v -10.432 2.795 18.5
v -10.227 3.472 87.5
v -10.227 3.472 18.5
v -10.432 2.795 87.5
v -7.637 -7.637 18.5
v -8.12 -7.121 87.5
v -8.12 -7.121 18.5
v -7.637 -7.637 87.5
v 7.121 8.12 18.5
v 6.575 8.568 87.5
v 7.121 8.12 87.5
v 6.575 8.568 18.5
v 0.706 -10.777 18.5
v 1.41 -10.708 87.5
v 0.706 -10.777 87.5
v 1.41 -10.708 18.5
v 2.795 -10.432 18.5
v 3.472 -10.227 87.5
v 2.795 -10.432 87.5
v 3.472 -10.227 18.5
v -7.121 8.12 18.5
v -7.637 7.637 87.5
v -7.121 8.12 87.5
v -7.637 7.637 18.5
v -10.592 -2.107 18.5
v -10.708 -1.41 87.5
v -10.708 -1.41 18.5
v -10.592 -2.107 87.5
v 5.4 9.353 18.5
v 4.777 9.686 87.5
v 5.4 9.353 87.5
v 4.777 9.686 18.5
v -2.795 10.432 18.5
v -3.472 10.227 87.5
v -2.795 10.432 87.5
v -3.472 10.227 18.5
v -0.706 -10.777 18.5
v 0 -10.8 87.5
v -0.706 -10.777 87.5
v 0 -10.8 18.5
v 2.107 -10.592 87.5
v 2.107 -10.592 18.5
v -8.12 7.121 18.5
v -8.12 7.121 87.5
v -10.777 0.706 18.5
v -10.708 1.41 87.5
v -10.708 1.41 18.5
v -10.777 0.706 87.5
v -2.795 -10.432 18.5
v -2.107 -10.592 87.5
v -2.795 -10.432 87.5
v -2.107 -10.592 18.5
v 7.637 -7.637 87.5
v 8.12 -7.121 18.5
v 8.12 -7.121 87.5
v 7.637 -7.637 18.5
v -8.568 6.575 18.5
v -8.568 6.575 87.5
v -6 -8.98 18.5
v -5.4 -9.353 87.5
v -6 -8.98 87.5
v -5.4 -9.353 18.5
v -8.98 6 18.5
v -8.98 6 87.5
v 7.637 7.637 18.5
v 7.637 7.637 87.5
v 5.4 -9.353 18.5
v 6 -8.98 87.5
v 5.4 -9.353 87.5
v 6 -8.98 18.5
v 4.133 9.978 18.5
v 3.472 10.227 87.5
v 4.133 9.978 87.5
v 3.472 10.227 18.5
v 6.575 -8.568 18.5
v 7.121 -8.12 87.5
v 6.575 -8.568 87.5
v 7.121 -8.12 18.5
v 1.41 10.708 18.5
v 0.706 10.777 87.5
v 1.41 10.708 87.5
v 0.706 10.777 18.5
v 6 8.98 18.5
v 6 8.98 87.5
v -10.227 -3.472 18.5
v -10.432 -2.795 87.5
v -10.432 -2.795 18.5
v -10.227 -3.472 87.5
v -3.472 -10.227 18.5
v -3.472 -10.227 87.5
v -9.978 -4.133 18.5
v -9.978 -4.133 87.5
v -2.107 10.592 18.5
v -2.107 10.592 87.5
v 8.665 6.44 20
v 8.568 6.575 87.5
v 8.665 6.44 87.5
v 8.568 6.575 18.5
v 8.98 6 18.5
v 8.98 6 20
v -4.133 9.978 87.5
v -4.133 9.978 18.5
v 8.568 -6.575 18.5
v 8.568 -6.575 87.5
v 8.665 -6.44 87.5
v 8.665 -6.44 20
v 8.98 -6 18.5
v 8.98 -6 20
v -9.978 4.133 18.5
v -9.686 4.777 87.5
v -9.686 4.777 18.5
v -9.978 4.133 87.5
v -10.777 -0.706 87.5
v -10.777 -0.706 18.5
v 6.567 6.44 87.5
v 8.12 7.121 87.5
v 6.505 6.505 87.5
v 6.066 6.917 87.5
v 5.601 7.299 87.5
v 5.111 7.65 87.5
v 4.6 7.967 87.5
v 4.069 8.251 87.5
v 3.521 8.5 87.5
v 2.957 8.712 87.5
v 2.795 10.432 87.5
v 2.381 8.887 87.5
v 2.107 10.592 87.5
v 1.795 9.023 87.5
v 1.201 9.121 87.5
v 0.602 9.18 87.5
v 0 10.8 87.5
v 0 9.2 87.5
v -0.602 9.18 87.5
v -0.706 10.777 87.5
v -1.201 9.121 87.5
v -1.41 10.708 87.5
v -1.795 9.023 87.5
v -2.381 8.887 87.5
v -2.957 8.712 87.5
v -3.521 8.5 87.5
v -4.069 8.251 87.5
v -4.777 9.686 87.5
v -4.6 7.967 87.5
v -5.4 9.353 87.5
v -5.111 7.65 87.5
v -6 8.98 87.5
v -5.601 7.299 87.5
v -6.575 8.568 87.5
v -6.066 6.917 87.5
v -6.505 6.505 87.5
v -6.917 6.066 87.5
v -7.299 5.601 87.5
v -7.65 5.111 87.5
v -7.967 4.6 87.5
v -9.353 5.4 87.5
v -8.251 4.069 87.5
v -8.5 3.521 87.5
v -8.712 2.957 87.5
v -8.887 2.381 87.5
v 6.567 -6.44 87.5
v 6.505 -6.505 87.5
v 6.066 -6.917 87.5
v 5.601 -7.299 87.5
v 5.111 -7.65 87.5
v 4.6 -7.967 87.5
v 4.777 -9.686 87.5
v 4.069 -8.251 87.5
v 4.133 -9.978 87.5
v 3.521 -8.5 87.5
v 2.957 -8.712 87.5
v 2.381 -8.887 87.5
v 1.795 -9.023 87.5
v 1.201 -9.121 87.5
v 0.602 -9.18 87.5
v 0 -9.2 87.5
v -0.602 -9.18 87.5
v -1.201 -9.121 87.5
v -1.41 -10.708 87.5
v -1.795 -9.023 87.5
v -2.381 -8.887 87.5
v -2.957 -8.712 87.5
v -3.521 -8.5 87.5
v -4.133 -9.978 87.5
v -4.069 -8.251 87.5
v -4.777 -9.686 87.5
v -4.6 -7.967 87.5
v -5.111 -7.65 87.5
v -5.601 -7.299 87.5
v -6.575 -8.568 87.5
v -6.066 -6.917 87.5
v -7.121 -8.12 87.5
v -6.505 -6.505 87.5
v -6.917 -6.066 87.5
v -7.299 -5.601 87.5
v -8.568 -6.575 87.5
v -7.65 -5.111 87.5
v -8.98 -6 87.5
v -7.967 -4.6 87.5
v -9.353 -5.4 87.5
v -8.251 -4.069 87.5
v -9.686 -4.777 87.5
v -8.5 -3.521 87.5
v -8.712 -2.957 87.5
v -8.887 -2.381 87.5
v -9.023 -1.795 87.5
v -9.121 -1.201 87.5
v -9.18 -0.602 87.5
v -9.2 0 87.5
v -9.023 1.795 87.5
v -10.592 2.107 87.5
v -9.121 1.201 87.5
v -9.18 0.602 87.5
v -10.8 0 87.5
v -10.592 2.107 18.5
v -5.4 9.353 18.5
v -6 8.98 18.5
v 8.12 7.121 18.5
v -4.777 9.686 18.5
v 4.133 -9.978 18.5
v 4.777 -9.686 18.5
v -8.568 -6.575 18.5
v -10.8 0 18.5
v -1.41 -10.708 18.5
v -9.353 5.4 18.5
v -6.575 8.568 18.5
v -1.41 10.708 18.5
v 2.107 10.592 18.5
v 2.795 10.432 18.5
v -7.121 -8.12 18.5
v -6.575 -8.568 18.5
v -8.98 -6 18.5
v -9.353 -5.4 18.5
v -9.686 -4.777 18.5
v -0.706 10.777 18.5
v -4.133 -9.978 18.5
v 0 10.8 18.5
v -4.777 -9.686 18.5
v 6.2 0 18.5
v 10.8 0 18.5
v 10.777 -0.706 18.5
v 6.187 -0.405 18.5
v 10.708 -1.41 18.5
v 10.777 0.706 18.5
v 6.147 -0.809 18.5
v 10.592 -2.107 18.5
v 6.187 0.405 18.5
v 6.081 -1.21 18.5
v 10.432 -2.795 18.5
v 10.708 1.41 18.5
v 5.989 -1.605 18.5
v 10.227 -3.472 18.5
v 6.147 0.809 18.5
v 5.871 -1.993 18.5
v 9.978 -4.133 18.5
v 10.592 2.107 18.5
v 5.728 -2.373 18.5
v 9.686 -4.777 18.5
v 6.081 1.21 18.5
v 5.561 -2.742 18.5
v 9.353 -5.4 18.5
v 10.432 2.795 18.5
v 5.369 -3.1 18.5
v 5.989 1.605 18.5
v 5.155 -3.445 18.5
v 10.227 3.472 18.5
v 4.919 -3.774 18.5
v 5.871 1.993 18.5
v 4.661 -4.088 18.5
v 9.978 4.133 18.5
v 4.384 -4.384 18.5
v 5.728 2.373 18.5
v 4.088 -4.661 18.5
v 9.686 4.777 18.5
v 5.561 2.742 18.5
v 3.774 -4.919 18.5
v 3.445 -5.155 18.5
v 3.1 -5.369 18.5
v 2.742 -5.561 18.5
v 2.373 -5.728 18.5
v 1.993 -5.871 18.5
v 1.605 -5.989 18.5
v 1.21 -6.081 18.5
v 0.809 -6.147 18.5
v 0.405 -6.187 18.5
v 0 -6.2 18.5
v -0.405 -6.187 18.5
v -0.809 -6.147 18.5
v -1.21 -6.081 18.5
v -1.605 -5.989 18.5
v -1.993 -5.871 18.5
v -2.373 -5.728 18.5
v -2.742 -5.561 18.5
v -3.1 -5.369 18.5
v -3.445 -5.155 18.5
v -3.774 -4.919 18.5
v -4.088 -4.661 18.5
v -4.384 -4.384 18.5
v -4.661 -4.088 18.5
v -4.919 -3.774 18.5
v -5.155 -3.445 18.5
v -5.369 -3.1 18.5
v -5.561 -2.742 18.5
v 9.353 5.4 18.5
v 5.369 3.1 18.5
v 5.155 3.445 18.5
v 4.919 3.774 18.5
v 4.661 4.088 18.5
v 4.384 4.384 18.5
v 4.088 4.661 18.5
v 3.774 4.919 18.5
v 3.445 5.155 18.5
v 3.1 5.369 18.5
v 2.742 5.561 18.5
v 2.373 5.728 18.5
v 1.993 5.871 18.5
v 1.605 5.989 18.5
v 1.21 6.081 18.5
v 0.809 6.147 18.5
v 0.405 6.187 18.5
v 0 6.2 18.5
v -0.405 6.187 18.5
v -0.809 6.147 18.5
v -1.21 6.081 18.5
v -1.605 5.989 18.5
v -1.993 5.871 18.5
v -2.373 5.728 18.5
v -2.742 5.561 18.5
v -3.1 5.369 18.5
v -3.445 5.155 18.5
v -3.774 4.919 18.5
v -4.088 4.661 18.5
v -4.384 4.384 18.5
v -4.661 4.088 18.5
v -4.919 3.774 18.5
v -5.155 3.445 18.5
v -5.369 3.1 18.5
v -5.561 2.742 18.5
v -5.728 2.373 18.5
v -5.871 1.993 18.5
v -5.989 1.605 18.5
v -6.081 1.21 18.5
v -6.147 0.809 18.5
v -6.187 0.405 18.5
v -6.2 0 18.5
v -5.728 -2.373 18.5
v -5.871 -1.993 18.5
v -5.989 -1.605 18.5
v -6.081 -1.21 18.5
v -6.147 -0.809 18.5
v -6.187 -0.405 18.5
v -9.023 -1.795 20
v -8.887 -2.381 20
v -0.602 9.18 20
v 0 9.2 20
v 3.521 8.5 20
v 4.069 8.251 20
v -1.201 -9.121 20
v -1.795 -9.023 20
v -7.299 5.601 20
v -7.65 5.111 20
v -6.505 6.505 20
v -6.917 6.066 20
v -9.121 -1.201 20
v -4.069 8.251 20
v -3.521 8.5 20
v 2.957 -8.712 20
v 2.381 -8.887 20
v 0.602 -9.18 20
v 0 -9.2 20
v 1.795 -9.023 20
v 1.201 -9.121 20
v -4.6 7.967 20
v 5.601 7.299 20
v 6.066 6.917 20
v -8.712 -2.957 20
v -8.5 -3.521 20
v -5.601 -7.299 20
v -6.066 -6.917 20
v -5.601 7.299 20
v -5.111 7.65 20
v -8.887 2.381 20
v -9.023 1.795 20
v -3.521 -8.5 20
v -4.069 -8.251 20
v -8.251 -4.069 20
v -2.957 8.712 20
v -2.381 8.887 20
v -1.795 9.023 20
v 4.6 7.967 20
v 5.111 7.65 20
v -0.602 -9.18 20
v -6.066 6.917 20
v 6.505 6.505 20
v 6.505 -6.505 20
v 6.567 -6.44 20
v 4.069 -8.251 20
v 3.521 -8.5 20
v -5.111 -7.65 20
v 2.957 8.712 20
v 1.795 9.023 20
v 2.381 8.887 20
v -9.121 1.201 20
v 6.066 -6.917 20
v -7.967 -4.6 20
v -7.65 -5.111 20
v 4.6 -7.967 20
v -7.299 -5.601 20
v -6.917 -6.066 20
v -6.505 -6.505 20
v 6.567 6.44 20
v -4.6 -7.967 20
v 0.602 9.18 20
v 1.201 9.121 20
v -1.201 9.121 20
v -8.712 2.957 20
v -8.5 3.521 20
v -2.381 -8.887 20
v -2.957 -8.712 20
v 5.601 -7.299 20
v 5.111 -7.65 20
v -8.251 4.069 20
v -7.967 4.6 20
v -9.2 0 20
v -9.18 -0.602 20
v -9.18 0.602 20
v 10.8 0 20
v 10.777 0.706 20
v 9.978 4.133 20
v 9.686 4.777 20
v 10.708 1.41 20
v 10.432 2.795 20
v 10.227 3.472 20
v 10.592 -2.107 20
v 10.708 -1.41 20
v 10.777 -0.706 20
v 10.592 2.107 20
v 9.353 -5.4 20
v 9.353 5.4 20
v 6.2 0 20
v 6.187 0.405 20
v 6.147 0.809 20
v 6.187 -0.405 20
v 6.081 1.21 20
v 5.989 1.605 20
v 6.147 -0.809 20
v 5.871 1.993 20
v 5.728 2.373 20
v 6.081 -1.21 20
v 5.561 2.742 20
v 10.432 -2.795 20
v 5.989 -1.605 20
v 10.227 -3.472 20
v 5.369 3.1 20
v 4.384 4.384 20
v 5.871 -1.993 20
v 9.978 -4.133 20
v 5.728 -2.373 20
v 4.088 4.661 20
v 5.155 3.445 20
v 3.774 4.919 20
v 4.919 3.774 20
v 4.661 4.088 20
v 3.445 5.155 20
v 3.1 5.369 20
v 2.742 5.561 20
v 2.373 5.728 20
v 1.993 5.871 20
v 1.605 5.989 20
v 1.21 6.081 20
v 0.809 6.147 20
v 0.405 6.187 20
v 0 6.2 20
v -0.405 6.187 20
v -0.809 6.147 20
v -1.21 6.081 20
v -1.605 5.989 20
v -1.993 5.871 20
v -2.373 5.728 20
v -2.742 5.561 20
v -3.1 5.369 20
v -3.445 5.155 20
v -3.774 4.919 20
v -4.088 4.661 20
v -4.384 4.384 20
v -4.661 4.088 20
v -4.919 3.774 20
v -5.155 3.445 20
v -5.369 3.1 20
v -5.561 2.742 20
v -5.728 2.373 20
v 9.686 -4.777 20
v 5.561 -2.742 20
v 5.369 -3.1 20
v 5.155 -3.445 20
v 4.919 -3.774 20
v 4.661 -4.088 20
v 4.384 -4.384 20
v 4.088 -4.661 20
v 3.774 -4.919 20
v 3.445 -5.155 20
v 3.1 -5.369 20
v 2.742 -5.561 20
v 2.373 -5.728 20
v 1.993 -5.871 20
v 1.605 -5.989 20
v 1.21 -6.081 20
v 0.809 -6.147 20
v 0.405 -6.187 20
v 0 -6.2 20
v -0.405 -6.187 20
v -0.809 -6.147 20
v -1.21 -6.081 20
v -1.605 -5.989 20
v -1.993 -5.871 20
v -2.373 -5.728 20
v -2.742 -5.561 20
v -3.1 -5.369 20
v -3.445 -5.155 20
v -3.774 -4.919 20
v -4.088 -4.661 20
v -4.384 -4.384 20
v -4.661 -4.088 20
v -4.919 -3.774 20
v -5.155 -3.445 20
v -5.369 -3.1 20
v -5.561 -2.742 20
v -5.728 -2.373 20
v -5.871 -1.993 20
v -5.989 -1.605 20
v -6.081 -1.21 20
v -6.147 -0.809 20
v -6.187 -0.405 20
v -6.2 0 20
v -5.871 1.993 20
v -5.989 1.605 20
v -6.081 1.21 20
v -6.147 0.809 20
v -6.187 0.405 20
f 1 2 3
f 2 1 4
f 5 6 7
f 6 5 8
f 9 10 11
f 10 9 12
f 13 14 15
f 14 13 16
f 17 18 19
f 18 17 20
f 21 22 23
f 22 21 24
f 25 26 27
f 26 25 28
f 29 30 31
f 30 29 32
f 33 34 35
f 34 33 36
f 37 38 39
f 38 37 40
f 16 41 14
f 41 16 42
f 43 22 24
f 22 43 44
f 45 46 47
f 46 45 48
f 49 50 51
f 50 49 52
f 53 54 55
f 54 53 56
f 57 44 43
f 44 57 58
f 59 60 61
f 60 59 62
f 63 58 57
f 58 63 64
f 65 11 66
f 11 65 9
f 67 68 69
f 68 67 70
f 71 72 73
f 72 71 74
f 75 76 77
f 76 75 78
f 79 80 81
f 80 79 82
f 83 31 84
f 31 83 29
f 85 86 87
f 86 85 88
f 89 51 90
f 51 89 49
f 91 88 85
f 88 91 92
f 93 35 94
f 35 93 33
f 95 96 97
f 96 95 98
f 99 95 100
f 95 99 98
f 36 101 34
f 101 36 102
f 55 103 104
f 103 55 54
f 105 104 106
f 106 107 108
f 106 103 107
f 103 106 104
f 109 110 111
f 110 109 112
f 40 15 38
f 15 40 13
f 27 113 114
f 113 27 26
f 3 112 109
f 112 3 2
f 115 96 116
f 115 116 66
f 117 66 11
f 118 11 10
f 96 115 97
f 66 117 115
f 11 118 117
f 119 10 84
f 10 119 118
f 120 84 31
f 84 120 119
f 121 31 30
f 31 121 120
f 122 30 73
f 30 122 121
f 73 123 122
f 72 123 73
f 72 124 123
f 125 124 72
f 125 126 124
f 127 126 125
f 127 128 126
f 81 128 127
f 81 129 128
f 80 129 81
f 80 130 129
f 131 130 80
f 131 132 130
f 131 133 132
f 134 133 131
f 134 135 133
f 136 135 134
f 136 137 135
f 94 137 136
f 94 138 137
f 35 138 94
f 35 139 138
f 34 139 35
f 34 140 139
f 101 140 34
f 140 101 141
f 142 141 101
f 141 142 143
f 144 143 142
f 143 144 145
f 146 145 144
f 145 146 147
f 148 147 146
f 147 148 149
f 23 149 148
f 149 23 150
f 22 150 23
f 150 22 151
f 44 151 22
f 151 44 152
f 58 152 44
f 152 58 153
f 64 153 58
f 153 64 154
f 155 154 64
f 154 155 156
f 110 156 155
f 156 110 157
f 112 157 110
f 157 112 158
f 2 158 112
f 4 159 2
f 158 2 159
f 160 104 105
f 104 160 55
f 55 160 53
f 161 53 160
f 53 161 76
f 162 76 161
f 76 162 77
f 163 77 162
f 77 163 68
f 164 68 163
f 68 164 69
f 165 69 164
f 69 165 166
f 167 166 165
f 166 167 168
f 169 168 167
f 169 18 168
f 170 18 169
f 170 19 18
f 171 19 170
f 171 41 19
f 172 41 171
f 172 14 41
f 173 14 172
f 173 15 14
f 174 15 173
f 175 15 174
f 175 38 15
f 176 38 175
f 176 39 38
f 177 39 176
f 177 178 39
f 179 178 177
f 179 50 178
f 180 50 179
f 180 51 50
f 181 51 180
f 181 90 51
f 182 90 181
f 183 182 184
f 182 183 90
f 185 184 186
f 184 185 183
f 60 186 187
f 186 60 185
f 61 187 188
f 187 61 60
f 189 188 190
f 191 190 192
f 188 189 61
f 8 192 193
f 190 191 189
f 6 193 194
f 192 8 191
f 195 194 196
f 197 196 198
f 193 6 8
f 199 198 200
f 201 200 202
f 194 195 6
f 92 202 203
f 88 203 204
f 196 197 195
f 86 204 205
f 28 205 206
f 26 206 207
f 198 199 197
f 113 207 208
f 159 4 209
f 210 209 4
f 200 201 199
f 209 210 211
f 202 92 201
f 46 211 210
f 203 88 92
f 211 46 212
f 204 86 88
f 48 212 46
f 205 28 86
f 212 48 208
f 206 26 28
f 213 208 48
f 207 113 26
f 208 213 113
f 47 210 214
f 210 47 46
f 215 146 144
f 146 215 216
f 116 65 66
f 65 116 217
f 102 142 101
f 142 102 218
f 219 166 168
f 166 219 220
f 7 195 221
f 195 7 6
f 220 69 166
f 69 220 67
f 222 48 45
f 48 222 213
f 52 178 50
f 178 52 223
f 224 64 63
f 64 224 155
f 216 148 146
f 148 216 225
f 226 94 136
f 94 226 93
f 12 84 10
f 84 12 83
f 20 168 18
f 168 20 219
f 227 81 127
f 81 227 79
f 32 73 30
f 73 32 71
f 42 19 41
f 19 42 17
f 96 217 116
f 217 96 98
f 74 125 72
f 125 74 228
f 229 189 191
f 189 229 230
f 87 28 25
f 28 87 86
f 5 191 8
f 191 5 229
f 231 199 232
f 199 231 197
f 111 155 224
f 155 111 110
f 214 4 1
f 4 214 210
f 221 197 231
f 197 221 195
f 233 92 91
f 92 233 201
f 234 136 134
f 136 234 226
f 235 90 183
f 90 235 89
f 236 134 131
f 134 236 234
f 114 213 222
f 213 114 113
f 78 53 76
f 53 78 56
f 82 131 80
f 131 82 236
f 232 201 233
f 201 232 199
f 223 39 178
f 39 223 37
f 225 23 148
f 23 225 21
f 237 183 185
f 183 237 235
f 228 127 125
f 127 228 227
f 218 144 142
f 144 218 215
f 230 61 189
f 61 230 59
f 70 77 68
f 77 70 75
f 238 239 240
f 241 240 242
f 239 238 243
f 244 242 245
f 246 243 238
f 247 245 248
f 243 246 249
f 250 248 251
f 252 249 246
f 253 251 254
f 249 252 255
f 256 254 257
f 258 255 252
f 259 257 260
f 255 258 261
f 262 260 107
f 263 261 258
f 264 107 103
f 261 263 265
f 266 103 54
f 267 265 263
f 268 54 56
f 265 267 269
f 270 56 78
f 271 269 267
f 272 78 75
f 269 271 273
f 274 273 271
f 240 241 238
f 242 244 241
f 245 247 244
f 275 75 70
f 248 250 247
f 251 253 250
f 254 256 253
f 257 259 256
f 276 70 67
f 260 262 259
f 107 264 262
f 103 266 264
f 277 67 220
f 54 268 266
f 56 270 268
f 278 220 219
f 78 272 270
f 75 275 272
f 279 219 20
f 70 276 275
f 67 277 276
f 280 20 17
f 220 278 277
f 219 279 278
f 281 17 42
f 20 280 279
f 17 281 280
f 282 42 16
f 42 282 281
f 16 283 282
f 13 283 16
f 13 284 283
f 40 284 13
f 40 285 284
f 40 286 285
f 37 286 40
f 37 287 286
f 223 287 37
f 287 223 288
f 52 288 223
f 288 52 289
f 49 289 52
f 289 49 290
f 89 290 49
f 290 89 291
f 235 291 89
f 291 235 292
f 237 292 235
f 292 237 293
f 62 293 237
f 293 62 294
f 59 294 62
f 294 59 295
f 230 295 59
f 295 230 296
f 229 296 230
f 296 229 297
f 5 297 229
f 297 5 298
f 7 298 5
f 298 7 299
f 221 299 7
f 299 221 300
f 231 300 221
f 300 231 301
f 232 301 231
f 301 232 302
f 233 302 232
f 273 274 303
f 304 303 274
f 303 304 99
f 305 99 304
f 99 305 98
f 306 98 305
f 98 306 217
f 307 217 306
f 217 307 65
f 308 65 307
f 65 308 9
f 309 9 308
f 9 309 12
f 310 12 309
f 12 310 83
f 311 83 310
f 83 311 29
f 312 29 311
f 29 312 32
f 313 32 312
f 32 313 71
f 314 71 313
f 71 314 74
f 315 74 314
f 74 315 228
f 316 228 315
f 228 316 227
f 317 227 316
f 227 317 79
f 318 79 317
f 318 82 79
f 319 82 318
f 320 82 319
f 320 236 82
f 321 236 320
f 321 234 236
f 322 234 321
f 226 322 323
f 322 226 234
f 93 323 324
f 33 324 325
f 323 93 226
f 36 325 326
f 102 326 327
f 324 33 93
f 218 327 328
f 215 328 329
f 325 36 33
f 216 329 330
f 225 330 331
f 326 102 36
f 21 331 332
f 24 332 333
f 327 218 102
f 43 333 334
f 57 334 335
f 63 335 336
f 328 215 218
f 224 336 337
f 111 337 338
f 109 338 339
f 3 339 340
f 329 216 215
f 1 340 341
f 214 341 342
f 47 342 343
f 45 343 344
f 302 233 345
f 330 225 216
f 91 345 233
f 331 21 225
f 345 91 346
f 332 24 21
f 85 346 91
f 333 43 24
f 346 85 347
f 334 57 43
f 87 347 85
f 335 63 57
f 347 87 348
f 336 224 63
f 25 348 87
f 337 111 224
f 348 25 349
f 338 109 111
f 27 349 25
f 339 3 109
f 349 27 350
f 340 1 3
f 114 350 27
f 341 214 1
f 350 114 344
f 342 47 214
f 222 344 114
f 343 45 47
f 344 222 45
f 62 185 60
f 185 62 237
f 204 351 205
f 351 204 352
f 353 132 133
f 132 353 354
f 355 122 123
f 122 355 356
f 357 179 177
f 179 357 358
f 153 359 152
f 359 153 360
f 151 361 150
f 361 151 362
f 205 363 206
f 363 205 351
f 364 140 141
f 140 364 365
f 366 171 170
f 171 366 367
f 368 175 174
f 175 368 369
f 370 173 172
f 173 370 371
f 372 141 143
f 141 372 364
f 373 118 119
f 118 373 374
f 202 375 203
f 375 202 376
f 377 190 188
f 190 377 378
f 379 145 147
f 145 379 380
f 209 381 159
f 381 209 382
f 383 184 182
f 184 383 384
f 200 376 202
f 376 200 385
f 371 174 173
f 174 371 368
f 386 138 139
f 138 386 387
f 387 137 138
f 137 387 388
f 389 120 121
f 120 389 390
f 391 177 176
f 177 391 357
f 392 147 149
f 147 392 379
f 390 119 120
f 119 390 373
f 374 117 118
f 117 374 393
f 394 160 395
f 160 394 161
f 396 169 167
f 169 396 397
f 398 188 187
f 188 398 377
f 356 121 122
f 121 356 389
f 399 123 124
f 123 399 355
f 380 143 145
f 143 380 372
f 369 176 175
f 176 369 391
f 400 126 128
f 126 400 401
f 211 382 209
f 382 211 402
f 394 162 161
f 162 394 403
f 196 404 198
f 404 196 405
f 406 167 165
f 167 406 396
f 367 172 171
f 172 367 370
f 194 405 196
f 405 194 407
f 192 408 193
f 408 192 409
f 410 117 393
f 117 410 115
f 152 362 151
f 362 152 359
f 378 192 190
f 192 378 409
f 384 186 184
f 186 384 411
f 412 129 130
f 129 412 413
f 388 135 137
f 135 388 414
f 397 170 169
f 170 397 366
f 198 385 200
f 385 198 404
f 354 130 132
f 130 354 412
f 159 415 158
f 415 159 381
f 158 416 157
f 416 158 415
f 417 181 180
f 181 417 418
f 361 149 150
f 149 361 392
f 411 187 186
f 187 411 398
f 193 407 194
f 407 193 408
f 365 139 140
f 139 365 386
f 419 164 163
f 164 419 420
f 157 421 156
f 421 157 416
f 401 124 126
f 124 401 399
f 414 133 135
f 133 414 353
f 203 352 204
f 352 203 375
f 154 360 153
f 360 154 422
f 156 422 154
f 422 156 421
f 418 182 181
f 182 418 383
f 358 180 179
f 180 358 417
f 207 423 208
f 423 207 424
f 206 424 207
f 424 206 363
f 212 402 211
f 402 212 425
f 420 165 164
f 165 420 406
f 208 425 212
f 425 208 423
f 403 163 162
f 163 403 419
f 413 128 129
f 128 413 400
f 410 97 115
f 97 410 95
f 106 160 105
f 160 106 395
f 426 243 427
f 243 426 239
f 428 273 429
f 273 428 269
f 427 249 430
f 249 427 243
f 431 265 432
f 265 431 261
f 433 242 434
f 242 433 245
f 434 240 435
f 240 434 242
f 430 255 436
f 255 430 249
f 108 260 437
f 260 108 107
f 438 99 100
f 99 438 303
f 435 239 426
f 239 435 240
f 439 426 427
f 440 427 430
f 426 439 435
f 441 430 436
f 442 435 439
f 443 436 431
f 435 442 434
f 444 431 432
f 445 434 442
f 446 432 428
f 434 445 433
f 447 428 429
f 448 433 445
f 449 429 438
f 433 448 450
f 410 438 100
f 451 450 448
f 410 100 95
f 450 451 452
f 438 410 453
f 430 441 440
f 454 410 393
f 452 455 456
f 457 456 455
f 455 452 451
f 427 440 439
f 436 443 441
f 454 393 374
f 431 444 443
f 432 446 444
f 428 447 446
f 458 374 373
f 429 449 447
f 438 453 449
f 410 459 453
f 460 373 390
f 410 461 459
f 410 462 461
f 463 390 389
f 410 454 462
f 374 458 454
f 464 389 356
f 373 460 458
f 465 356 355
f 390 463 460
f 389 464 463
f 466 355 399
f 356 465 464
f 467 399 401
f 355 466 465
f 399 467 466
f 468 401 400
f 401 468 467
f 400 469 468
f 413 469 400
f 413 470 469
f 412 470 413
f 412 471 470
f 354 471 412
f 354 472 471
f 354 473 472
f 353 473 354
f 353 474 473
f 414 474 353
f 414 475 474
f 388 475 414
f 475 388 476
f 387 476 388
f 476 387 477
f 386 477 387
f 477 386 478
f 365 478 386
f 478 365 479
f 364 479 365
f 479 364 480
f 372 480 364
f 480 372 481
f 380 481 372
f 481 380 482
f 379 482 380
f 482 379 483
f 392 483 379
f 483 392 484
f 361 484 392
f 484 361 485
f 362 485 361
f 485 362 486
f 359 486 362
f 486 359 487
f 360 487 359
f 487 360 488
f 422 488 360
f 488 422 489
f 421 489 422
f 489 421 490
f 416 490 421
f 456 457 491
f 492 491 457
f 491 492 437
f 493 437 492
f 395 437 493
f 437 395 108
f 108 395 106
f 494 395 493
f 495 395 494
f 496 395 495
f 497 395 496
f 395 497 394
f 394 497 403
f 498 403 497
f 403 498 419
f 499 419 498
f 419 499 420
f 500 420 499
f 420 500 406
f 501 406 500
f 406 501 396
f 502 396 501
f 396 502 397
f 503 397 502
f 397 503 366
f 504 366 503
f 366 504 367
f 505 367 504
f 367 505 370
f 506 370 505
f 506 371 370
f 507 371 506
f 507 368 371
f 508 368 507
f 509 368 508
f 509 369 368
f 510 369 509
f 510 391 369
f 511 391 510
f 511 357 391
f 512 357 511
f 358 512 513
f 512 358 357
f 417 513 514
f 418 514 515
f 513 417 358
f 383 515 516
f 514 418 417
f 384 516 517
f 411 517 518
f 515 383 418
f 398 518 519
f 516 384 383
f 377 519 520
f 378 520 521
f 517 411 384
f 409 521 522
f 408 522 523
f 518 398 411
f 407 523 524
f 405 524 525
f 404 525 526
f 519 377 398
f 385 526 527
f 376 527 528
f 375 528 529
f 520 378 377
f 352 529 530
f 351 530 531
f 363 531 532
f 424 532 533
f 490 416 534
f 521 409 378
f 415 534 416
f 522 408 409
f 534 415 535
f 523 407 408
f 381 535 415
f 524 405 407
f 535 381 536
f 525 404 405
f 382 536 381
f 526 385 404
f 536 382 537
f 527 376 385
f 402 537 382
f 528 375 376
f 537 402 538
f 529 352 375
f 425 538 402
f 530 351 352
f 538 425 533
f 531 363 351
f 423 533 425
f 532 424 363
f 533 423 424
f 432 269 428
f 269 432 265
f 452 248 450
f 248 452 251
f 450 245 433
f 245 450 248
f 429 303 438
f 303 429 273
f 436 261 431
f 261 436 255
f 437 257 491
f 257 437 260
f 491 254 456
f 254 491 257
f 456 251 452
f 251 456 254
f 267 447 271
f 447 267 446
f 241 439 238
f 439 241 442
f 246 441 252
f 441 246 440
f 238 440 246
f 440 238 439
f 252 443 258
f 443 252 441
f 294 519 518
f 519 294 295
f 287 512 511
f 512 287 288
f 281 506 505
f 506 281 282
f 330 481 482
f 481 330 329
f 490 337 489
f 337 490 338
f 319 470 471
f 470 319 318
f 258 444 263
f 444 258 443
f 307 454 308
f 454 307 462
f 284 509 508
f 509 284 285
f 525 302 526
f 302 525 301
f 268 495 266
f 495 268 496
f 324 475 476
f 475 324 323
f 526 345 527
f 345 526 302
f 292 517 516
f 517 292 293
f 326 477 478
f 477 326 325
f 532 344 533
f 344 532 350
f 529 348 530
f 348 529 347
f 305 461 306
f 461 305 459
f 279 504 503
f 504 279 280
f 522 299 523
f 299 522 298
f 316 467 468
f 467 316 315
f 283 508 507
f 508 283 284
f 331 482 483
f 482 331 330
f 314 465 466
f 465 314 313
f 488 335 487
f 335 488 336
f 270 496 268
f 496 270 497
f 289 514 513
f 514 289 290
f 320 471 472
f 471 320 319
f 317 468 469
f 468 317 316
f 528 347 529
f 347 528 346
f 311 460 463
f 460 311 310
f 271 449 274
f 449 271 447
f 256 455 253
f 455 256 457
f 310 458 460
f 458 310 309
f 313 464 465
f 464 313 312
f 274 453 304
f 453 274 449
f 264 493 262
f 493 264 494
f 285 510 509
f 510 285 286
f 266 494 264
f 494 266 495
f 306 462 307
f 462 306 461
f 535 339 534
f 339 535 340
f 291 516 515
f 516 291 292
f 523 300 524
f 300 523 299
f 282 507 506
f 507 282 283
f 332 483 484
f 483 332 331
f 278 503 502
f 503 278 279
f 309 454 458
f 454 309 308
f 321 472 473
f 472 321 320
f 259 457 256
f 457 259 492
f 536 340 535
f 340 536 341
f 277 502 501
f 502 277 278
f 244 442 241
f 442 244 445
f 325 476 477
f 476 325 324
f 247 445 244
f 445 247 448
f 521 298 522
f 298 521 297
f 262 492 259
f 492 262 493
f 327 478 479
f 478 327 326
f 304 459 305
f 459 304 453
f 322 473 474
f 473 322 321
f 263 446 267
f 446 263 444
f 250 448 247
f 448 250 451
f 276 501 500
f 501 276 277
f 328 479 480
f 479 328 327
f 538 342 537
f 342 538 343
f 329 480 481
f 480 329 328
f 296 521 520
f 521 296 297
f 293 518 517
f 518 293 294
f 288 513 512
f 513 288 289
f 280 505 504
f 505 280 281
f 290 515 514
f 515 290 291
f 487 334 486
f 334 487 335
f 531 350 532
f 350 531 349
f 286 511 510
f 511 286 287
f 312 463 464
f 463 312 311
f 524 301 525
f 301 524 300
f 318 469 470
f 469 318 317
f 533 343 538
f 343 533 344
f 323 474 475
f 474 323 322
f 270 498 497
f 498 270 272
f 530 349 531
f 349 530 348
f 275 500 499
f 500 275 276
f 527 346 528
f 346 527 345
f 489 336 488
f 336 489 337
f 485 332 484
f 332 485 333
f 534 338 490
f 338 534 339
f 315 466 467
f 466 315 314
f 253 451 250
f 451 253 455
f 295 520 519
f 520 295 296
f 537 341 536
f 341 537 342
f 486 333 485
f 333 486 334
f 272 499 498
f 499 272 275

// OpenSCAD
// oyster-chassis.scad
// Sliding chassis for the Oyster island wind-station emitter tube.
// Holds the 18650 cell, the Pico, the RFM95W and the antenna feed in line
// inside a 30.5 mm PVC bore. Parameterised: every number is named and the
// physical rules are enforced by assertions at the bottom of this block.
//
// Render one station at a time to stay inside 4 GB of RAM:
//   openscad -D part=0 -o /tmp/stack.stl     oyster-chassis.scad  // full stack
//   openscad -D part=1 -o /tmp/cradle.stl    oyster-chassis.scad  // cell cradle
//   openscad -D part=2 -o /tmp/section_a.stl oyster-chassis.scad  // z 0   -> 89
//   openscad -D part=3 -o /tmp/section_b.stl oyster-chassis.scad  // z 89  -> 357

$fn = 96; // modest tessellation for a 4 GB machine

// Numeric part selector: integers only, since -D part="name" is stripped by the
// shell and silently falls through to the default branch.
//   0 = full stack   1 = cell cradle   2 = section_a (z 0->89)   3 = section_b (z 89->357)
part = 0;

// ---------------------------------------------------------------------------
// Parameter block
// ---------------------------------------------------------------------------

// --- PVC tube (measured with a caliper) ---
pvc_bore = 30.5;   // measured: PVC inner diameter
pvc_od   = 34.2;   // measured: PVC outer diameter
pvc_wall = 1.85;   // measured: PVC wall thickness

// --- Printed chassis ---
chassis_od   = 29.7;                          // derived: pvc_bore - 0.8 mm diametral clearance
chassis_wall = 1.8;                           // design: printed wall
chassis_bore = chassis_od - 2 * chassis_wall; // derived: ~26.1 mm internal bore

// --- Printer ---
printer_z = 300;   // measured: Voron usable Z

// --- Components (measured) ---
cell_d      = 18.4;  // measured: protected 18650 diameter
cell_l      = 69.0;  // measured: protected 18650 length (protected ~5 mm longer than bare)
cell_hold_w = 21.0;  // measured: cell-in-cradle width
cell_hold_h = 17.0;  // measured: cell-in-cradle depth
pico_w      = 21.0;  // measured: Pico width  (CONFIRM with calipers before printing)
pico_l      = 51.0;  // measured: Pico length (CONFIRM with calipers before printing)
pico_t      = 4.0;   // measured: Pico thickness
pico_bay_t  = 6.0;   // design: Pico + solder joints, no Dupont header stack
radio_w     = 16.0;  // measured: RFM95W width
radio_l     = 16.0;  // measured: RFM95W length

// --- Cell cradle (design) ---
cradle_od   = 21.6;                 // design: snap-in thin C-sleeve outer diameter
cradle_wall = 1.6;                  // design: thin wall so the snap can flex
cradle_bore = cradle_od - 2*cradle_wall; // derived: 18.4 mm resting grip bore
                                    //   (the C-slot lets the sleeve flex past the
                                    //    18.4 cell; cradle_grip is the flexed entry)
cradle_grip  = cell_d + 0.4;        // derived: 18.8 mm flexed grip / snap entry
cradle_slot  = 0.70 * cell_d;       // derived: slot width ~70 % of cell diameter
stop_ring_h  = 1.5;                 // design: bottom stop-ring shoulder, cell rests here
stop_hole_d  = cell_d - 6.0;        // derived: 12.4 mm stop-ring hole (3 mm shoulder)

// --- RF / antenna (physics, do not change) ---
freq_mhz      = 868;              // frozen: LoRa centre frequency
lambda        = 300 / freq_mhz * 1000; // derived: ~345.6 mm at 868 MHz
lambda_quarter = lambda / 4;     // derived: ~86.4 mm
lambda_tenth   = lambda / 10;    // derived: ~34.6 mm
radiator_len  = 86.0;            // design: straight lambda/4 wire on axis
clearance_min = 50.0;            // design: minimum radiator clearance (>= lambda/10 ideal 80-100)

// --- Station layout, bottom (z=0) to top (measured/derived stack-up) ---
cap_h        = 20.0;                     // service cap + desiccant space
cell_z0      = cap_h;                    // 20
cell_z1      = cell_z0 + cell_l;         // 89
pico_bay_l   = 56.0;                     // Pico bay, wires leaving axially
pico_z0      = cell_z1;                  // 89
pico_z1      = pico_z0 + pico_bay_l;     // 145
sleeve_l     = 90.0;                     // counterpoise sleeve carrier
sleeve_z0    = pico_z1;                  // 145
sleeve_z1    = sleeve_z0 + sleeve_l;     // 235
radio_z0     = sleeve_z1;                // 235
radio_z1     = radio_z0 + radio_l;       // 251
radiator_z0  = radio_z1;                 // 251
radiator_z1  = radiator_z0 + radiator_len; // 337
headroom     = 20.0;                     // headroom to the sealed top
total_l      = radiator_z1 + headroom;   // 357

split_z      = cell_z1;                  // 89: joint in the plain region above the cell
section_a_l  = split_z;                  // 0   -> 89
section_b_l  = total_l - split_z;        // 89  -> 357

// --- Counterpoise sleeve carrier (design) ---
sleeve_boss_od = 20.0;   // design: slides inside a 22 mm copper-pipe offcut (ID ~20.2)

// --- Derived clearances: radiator start to the hottest conductors below it ---
clearance_cell = radiator_z0 - cell_z1;  // derived: 251 - 89  = 162
clearance_pico = radiator_z0 - pico_z1;  // derived: 251 - 145 = 106

// ---------------------------------------------------------------------------
// Assertions: encode the physical rules. Do not loosen to make a render pass.
// ---------------------------------------------------------------------------
assert(chassis_od < pvc_bore,
       "chassis OD must be under the PVC bore");
assert(chassis_bore > cell_d,
       "chassis bore must clear the cell diameter");
assert(chassis_bore > cell_hold_w,
       "chassis bore must clear the cell-in-cradle width");
assert(cradle_od < chassis_bore,
       "cell cradle outer must clear the chassis bore");
assert(sqrt(pico_bay_t * pico_bay_t + pico_w * pico_w) < chassis_bore,
       "Pico cross-section diagonal must clear the chassis bore");
assert(cell_z1 <= pico_z0,
       "cell and Pico must not overlap axially (they sit in series)");
assert(clearance_cell >= clearance_min,
       "radiator clearance to the cell must be >= clearance_min");
assert(clearance_pico >= clearance_min,
       "radiator clearance to the Pico must be >= clearance_min");
assert(section_a_l <= printer_z && section_b_l <= printer_z,
       "each printed segment must fit under the printer height");

// ---------------------------------------------------------------------------
// ECHO report
// ---------------------------------------------------------------------------
echo(str("chassis OD      = ", chassis_od, " mm  (PVC bore ", pvc_bore, " mm)"));
echo(str("chassis bore    = ", chassis_bore, " mm"));
echo(str("total length    = ", total_l, " mm  (section_a ", section_a_l,
         " + section_b ", section_b_l, ")"));
echo(str("segment split   = z ", split_z, " mm"));
echo(str("lambda/4        = ", lambda_quarter, " mm  (radiator ", radiator_len, " mm)"));
echo(str("lambda/10       = ", lambda_tenth, " mm  (min clearance ", clearance_min, " mm)"));
echo(str("radiator->cell  = ", clearance_cell, " mm"));
echo(str("radiator->Pico  = ", clearance_pico, " mm"));

// ---------------------------------------------------------------------------
// Geometry
// ---------------------------------------------------------------------------

// Snap-in thin C-sleeve that holds the 18650. The thin 1.6 mm wall is what lets
// the C flex; a thick ring could not. A bottom stop ring catches the cell so it
// cannot slide down. Standalone the module is built with the cell seat at
// stop_ring_h and spans z 0 -> cell_l; the full stack shifts it down by
// stop_ring_h so the seat lands exactly at cell_z0.
module cell_cradle() {
    difference() {
        union() {
            // sleeve shell
            difference() {
                cylinder(d = cradle_od, h = cell_l);
                translate([0, 0, -0.1])
                    cylinder(d = cradle_bore, h = cell_l + 0.2);
                // C-slot, opening toward +X
                translate([cradle_od / 2, 0, (cell_l - 0.2) / 2])
                    cube([cradle_od, cradle_slot, cell_l + 0.2], center = true);
            }
            // bottom stop ring (annular shoulder the cell rests on)
            difference() {
                cylinder(d = cradle_od, h = stop_ring_h);
                translate([0, 0, -0.1])
                    cylinder(d = stop_hole_d, h = stop_ring_h + 0.2);
            }
        }
    }
}

// Full 357 mm stack, bottom (z=0) to top. Stations are added in later commits.
module full_stack() {
    translate([0, 0, cell_z0 - stop_ring_h]) cell_cradle();
}

module section_a() {
    translate([0, 0, cell_z0 - stop_ring_h]) cell_cradle();
}

module section_b() {
}

// ---------------------------------------------------------------------------
// Numeric part dispatch (integers only)
// ---------------------------------------------------------------------------
if (part == 0) {
    full_stack();
} else if (part == 1) {
    cell_cradle();
} else if (part == 2) {
    section_a();
} else if (part == 3) {
    section_b();
}
